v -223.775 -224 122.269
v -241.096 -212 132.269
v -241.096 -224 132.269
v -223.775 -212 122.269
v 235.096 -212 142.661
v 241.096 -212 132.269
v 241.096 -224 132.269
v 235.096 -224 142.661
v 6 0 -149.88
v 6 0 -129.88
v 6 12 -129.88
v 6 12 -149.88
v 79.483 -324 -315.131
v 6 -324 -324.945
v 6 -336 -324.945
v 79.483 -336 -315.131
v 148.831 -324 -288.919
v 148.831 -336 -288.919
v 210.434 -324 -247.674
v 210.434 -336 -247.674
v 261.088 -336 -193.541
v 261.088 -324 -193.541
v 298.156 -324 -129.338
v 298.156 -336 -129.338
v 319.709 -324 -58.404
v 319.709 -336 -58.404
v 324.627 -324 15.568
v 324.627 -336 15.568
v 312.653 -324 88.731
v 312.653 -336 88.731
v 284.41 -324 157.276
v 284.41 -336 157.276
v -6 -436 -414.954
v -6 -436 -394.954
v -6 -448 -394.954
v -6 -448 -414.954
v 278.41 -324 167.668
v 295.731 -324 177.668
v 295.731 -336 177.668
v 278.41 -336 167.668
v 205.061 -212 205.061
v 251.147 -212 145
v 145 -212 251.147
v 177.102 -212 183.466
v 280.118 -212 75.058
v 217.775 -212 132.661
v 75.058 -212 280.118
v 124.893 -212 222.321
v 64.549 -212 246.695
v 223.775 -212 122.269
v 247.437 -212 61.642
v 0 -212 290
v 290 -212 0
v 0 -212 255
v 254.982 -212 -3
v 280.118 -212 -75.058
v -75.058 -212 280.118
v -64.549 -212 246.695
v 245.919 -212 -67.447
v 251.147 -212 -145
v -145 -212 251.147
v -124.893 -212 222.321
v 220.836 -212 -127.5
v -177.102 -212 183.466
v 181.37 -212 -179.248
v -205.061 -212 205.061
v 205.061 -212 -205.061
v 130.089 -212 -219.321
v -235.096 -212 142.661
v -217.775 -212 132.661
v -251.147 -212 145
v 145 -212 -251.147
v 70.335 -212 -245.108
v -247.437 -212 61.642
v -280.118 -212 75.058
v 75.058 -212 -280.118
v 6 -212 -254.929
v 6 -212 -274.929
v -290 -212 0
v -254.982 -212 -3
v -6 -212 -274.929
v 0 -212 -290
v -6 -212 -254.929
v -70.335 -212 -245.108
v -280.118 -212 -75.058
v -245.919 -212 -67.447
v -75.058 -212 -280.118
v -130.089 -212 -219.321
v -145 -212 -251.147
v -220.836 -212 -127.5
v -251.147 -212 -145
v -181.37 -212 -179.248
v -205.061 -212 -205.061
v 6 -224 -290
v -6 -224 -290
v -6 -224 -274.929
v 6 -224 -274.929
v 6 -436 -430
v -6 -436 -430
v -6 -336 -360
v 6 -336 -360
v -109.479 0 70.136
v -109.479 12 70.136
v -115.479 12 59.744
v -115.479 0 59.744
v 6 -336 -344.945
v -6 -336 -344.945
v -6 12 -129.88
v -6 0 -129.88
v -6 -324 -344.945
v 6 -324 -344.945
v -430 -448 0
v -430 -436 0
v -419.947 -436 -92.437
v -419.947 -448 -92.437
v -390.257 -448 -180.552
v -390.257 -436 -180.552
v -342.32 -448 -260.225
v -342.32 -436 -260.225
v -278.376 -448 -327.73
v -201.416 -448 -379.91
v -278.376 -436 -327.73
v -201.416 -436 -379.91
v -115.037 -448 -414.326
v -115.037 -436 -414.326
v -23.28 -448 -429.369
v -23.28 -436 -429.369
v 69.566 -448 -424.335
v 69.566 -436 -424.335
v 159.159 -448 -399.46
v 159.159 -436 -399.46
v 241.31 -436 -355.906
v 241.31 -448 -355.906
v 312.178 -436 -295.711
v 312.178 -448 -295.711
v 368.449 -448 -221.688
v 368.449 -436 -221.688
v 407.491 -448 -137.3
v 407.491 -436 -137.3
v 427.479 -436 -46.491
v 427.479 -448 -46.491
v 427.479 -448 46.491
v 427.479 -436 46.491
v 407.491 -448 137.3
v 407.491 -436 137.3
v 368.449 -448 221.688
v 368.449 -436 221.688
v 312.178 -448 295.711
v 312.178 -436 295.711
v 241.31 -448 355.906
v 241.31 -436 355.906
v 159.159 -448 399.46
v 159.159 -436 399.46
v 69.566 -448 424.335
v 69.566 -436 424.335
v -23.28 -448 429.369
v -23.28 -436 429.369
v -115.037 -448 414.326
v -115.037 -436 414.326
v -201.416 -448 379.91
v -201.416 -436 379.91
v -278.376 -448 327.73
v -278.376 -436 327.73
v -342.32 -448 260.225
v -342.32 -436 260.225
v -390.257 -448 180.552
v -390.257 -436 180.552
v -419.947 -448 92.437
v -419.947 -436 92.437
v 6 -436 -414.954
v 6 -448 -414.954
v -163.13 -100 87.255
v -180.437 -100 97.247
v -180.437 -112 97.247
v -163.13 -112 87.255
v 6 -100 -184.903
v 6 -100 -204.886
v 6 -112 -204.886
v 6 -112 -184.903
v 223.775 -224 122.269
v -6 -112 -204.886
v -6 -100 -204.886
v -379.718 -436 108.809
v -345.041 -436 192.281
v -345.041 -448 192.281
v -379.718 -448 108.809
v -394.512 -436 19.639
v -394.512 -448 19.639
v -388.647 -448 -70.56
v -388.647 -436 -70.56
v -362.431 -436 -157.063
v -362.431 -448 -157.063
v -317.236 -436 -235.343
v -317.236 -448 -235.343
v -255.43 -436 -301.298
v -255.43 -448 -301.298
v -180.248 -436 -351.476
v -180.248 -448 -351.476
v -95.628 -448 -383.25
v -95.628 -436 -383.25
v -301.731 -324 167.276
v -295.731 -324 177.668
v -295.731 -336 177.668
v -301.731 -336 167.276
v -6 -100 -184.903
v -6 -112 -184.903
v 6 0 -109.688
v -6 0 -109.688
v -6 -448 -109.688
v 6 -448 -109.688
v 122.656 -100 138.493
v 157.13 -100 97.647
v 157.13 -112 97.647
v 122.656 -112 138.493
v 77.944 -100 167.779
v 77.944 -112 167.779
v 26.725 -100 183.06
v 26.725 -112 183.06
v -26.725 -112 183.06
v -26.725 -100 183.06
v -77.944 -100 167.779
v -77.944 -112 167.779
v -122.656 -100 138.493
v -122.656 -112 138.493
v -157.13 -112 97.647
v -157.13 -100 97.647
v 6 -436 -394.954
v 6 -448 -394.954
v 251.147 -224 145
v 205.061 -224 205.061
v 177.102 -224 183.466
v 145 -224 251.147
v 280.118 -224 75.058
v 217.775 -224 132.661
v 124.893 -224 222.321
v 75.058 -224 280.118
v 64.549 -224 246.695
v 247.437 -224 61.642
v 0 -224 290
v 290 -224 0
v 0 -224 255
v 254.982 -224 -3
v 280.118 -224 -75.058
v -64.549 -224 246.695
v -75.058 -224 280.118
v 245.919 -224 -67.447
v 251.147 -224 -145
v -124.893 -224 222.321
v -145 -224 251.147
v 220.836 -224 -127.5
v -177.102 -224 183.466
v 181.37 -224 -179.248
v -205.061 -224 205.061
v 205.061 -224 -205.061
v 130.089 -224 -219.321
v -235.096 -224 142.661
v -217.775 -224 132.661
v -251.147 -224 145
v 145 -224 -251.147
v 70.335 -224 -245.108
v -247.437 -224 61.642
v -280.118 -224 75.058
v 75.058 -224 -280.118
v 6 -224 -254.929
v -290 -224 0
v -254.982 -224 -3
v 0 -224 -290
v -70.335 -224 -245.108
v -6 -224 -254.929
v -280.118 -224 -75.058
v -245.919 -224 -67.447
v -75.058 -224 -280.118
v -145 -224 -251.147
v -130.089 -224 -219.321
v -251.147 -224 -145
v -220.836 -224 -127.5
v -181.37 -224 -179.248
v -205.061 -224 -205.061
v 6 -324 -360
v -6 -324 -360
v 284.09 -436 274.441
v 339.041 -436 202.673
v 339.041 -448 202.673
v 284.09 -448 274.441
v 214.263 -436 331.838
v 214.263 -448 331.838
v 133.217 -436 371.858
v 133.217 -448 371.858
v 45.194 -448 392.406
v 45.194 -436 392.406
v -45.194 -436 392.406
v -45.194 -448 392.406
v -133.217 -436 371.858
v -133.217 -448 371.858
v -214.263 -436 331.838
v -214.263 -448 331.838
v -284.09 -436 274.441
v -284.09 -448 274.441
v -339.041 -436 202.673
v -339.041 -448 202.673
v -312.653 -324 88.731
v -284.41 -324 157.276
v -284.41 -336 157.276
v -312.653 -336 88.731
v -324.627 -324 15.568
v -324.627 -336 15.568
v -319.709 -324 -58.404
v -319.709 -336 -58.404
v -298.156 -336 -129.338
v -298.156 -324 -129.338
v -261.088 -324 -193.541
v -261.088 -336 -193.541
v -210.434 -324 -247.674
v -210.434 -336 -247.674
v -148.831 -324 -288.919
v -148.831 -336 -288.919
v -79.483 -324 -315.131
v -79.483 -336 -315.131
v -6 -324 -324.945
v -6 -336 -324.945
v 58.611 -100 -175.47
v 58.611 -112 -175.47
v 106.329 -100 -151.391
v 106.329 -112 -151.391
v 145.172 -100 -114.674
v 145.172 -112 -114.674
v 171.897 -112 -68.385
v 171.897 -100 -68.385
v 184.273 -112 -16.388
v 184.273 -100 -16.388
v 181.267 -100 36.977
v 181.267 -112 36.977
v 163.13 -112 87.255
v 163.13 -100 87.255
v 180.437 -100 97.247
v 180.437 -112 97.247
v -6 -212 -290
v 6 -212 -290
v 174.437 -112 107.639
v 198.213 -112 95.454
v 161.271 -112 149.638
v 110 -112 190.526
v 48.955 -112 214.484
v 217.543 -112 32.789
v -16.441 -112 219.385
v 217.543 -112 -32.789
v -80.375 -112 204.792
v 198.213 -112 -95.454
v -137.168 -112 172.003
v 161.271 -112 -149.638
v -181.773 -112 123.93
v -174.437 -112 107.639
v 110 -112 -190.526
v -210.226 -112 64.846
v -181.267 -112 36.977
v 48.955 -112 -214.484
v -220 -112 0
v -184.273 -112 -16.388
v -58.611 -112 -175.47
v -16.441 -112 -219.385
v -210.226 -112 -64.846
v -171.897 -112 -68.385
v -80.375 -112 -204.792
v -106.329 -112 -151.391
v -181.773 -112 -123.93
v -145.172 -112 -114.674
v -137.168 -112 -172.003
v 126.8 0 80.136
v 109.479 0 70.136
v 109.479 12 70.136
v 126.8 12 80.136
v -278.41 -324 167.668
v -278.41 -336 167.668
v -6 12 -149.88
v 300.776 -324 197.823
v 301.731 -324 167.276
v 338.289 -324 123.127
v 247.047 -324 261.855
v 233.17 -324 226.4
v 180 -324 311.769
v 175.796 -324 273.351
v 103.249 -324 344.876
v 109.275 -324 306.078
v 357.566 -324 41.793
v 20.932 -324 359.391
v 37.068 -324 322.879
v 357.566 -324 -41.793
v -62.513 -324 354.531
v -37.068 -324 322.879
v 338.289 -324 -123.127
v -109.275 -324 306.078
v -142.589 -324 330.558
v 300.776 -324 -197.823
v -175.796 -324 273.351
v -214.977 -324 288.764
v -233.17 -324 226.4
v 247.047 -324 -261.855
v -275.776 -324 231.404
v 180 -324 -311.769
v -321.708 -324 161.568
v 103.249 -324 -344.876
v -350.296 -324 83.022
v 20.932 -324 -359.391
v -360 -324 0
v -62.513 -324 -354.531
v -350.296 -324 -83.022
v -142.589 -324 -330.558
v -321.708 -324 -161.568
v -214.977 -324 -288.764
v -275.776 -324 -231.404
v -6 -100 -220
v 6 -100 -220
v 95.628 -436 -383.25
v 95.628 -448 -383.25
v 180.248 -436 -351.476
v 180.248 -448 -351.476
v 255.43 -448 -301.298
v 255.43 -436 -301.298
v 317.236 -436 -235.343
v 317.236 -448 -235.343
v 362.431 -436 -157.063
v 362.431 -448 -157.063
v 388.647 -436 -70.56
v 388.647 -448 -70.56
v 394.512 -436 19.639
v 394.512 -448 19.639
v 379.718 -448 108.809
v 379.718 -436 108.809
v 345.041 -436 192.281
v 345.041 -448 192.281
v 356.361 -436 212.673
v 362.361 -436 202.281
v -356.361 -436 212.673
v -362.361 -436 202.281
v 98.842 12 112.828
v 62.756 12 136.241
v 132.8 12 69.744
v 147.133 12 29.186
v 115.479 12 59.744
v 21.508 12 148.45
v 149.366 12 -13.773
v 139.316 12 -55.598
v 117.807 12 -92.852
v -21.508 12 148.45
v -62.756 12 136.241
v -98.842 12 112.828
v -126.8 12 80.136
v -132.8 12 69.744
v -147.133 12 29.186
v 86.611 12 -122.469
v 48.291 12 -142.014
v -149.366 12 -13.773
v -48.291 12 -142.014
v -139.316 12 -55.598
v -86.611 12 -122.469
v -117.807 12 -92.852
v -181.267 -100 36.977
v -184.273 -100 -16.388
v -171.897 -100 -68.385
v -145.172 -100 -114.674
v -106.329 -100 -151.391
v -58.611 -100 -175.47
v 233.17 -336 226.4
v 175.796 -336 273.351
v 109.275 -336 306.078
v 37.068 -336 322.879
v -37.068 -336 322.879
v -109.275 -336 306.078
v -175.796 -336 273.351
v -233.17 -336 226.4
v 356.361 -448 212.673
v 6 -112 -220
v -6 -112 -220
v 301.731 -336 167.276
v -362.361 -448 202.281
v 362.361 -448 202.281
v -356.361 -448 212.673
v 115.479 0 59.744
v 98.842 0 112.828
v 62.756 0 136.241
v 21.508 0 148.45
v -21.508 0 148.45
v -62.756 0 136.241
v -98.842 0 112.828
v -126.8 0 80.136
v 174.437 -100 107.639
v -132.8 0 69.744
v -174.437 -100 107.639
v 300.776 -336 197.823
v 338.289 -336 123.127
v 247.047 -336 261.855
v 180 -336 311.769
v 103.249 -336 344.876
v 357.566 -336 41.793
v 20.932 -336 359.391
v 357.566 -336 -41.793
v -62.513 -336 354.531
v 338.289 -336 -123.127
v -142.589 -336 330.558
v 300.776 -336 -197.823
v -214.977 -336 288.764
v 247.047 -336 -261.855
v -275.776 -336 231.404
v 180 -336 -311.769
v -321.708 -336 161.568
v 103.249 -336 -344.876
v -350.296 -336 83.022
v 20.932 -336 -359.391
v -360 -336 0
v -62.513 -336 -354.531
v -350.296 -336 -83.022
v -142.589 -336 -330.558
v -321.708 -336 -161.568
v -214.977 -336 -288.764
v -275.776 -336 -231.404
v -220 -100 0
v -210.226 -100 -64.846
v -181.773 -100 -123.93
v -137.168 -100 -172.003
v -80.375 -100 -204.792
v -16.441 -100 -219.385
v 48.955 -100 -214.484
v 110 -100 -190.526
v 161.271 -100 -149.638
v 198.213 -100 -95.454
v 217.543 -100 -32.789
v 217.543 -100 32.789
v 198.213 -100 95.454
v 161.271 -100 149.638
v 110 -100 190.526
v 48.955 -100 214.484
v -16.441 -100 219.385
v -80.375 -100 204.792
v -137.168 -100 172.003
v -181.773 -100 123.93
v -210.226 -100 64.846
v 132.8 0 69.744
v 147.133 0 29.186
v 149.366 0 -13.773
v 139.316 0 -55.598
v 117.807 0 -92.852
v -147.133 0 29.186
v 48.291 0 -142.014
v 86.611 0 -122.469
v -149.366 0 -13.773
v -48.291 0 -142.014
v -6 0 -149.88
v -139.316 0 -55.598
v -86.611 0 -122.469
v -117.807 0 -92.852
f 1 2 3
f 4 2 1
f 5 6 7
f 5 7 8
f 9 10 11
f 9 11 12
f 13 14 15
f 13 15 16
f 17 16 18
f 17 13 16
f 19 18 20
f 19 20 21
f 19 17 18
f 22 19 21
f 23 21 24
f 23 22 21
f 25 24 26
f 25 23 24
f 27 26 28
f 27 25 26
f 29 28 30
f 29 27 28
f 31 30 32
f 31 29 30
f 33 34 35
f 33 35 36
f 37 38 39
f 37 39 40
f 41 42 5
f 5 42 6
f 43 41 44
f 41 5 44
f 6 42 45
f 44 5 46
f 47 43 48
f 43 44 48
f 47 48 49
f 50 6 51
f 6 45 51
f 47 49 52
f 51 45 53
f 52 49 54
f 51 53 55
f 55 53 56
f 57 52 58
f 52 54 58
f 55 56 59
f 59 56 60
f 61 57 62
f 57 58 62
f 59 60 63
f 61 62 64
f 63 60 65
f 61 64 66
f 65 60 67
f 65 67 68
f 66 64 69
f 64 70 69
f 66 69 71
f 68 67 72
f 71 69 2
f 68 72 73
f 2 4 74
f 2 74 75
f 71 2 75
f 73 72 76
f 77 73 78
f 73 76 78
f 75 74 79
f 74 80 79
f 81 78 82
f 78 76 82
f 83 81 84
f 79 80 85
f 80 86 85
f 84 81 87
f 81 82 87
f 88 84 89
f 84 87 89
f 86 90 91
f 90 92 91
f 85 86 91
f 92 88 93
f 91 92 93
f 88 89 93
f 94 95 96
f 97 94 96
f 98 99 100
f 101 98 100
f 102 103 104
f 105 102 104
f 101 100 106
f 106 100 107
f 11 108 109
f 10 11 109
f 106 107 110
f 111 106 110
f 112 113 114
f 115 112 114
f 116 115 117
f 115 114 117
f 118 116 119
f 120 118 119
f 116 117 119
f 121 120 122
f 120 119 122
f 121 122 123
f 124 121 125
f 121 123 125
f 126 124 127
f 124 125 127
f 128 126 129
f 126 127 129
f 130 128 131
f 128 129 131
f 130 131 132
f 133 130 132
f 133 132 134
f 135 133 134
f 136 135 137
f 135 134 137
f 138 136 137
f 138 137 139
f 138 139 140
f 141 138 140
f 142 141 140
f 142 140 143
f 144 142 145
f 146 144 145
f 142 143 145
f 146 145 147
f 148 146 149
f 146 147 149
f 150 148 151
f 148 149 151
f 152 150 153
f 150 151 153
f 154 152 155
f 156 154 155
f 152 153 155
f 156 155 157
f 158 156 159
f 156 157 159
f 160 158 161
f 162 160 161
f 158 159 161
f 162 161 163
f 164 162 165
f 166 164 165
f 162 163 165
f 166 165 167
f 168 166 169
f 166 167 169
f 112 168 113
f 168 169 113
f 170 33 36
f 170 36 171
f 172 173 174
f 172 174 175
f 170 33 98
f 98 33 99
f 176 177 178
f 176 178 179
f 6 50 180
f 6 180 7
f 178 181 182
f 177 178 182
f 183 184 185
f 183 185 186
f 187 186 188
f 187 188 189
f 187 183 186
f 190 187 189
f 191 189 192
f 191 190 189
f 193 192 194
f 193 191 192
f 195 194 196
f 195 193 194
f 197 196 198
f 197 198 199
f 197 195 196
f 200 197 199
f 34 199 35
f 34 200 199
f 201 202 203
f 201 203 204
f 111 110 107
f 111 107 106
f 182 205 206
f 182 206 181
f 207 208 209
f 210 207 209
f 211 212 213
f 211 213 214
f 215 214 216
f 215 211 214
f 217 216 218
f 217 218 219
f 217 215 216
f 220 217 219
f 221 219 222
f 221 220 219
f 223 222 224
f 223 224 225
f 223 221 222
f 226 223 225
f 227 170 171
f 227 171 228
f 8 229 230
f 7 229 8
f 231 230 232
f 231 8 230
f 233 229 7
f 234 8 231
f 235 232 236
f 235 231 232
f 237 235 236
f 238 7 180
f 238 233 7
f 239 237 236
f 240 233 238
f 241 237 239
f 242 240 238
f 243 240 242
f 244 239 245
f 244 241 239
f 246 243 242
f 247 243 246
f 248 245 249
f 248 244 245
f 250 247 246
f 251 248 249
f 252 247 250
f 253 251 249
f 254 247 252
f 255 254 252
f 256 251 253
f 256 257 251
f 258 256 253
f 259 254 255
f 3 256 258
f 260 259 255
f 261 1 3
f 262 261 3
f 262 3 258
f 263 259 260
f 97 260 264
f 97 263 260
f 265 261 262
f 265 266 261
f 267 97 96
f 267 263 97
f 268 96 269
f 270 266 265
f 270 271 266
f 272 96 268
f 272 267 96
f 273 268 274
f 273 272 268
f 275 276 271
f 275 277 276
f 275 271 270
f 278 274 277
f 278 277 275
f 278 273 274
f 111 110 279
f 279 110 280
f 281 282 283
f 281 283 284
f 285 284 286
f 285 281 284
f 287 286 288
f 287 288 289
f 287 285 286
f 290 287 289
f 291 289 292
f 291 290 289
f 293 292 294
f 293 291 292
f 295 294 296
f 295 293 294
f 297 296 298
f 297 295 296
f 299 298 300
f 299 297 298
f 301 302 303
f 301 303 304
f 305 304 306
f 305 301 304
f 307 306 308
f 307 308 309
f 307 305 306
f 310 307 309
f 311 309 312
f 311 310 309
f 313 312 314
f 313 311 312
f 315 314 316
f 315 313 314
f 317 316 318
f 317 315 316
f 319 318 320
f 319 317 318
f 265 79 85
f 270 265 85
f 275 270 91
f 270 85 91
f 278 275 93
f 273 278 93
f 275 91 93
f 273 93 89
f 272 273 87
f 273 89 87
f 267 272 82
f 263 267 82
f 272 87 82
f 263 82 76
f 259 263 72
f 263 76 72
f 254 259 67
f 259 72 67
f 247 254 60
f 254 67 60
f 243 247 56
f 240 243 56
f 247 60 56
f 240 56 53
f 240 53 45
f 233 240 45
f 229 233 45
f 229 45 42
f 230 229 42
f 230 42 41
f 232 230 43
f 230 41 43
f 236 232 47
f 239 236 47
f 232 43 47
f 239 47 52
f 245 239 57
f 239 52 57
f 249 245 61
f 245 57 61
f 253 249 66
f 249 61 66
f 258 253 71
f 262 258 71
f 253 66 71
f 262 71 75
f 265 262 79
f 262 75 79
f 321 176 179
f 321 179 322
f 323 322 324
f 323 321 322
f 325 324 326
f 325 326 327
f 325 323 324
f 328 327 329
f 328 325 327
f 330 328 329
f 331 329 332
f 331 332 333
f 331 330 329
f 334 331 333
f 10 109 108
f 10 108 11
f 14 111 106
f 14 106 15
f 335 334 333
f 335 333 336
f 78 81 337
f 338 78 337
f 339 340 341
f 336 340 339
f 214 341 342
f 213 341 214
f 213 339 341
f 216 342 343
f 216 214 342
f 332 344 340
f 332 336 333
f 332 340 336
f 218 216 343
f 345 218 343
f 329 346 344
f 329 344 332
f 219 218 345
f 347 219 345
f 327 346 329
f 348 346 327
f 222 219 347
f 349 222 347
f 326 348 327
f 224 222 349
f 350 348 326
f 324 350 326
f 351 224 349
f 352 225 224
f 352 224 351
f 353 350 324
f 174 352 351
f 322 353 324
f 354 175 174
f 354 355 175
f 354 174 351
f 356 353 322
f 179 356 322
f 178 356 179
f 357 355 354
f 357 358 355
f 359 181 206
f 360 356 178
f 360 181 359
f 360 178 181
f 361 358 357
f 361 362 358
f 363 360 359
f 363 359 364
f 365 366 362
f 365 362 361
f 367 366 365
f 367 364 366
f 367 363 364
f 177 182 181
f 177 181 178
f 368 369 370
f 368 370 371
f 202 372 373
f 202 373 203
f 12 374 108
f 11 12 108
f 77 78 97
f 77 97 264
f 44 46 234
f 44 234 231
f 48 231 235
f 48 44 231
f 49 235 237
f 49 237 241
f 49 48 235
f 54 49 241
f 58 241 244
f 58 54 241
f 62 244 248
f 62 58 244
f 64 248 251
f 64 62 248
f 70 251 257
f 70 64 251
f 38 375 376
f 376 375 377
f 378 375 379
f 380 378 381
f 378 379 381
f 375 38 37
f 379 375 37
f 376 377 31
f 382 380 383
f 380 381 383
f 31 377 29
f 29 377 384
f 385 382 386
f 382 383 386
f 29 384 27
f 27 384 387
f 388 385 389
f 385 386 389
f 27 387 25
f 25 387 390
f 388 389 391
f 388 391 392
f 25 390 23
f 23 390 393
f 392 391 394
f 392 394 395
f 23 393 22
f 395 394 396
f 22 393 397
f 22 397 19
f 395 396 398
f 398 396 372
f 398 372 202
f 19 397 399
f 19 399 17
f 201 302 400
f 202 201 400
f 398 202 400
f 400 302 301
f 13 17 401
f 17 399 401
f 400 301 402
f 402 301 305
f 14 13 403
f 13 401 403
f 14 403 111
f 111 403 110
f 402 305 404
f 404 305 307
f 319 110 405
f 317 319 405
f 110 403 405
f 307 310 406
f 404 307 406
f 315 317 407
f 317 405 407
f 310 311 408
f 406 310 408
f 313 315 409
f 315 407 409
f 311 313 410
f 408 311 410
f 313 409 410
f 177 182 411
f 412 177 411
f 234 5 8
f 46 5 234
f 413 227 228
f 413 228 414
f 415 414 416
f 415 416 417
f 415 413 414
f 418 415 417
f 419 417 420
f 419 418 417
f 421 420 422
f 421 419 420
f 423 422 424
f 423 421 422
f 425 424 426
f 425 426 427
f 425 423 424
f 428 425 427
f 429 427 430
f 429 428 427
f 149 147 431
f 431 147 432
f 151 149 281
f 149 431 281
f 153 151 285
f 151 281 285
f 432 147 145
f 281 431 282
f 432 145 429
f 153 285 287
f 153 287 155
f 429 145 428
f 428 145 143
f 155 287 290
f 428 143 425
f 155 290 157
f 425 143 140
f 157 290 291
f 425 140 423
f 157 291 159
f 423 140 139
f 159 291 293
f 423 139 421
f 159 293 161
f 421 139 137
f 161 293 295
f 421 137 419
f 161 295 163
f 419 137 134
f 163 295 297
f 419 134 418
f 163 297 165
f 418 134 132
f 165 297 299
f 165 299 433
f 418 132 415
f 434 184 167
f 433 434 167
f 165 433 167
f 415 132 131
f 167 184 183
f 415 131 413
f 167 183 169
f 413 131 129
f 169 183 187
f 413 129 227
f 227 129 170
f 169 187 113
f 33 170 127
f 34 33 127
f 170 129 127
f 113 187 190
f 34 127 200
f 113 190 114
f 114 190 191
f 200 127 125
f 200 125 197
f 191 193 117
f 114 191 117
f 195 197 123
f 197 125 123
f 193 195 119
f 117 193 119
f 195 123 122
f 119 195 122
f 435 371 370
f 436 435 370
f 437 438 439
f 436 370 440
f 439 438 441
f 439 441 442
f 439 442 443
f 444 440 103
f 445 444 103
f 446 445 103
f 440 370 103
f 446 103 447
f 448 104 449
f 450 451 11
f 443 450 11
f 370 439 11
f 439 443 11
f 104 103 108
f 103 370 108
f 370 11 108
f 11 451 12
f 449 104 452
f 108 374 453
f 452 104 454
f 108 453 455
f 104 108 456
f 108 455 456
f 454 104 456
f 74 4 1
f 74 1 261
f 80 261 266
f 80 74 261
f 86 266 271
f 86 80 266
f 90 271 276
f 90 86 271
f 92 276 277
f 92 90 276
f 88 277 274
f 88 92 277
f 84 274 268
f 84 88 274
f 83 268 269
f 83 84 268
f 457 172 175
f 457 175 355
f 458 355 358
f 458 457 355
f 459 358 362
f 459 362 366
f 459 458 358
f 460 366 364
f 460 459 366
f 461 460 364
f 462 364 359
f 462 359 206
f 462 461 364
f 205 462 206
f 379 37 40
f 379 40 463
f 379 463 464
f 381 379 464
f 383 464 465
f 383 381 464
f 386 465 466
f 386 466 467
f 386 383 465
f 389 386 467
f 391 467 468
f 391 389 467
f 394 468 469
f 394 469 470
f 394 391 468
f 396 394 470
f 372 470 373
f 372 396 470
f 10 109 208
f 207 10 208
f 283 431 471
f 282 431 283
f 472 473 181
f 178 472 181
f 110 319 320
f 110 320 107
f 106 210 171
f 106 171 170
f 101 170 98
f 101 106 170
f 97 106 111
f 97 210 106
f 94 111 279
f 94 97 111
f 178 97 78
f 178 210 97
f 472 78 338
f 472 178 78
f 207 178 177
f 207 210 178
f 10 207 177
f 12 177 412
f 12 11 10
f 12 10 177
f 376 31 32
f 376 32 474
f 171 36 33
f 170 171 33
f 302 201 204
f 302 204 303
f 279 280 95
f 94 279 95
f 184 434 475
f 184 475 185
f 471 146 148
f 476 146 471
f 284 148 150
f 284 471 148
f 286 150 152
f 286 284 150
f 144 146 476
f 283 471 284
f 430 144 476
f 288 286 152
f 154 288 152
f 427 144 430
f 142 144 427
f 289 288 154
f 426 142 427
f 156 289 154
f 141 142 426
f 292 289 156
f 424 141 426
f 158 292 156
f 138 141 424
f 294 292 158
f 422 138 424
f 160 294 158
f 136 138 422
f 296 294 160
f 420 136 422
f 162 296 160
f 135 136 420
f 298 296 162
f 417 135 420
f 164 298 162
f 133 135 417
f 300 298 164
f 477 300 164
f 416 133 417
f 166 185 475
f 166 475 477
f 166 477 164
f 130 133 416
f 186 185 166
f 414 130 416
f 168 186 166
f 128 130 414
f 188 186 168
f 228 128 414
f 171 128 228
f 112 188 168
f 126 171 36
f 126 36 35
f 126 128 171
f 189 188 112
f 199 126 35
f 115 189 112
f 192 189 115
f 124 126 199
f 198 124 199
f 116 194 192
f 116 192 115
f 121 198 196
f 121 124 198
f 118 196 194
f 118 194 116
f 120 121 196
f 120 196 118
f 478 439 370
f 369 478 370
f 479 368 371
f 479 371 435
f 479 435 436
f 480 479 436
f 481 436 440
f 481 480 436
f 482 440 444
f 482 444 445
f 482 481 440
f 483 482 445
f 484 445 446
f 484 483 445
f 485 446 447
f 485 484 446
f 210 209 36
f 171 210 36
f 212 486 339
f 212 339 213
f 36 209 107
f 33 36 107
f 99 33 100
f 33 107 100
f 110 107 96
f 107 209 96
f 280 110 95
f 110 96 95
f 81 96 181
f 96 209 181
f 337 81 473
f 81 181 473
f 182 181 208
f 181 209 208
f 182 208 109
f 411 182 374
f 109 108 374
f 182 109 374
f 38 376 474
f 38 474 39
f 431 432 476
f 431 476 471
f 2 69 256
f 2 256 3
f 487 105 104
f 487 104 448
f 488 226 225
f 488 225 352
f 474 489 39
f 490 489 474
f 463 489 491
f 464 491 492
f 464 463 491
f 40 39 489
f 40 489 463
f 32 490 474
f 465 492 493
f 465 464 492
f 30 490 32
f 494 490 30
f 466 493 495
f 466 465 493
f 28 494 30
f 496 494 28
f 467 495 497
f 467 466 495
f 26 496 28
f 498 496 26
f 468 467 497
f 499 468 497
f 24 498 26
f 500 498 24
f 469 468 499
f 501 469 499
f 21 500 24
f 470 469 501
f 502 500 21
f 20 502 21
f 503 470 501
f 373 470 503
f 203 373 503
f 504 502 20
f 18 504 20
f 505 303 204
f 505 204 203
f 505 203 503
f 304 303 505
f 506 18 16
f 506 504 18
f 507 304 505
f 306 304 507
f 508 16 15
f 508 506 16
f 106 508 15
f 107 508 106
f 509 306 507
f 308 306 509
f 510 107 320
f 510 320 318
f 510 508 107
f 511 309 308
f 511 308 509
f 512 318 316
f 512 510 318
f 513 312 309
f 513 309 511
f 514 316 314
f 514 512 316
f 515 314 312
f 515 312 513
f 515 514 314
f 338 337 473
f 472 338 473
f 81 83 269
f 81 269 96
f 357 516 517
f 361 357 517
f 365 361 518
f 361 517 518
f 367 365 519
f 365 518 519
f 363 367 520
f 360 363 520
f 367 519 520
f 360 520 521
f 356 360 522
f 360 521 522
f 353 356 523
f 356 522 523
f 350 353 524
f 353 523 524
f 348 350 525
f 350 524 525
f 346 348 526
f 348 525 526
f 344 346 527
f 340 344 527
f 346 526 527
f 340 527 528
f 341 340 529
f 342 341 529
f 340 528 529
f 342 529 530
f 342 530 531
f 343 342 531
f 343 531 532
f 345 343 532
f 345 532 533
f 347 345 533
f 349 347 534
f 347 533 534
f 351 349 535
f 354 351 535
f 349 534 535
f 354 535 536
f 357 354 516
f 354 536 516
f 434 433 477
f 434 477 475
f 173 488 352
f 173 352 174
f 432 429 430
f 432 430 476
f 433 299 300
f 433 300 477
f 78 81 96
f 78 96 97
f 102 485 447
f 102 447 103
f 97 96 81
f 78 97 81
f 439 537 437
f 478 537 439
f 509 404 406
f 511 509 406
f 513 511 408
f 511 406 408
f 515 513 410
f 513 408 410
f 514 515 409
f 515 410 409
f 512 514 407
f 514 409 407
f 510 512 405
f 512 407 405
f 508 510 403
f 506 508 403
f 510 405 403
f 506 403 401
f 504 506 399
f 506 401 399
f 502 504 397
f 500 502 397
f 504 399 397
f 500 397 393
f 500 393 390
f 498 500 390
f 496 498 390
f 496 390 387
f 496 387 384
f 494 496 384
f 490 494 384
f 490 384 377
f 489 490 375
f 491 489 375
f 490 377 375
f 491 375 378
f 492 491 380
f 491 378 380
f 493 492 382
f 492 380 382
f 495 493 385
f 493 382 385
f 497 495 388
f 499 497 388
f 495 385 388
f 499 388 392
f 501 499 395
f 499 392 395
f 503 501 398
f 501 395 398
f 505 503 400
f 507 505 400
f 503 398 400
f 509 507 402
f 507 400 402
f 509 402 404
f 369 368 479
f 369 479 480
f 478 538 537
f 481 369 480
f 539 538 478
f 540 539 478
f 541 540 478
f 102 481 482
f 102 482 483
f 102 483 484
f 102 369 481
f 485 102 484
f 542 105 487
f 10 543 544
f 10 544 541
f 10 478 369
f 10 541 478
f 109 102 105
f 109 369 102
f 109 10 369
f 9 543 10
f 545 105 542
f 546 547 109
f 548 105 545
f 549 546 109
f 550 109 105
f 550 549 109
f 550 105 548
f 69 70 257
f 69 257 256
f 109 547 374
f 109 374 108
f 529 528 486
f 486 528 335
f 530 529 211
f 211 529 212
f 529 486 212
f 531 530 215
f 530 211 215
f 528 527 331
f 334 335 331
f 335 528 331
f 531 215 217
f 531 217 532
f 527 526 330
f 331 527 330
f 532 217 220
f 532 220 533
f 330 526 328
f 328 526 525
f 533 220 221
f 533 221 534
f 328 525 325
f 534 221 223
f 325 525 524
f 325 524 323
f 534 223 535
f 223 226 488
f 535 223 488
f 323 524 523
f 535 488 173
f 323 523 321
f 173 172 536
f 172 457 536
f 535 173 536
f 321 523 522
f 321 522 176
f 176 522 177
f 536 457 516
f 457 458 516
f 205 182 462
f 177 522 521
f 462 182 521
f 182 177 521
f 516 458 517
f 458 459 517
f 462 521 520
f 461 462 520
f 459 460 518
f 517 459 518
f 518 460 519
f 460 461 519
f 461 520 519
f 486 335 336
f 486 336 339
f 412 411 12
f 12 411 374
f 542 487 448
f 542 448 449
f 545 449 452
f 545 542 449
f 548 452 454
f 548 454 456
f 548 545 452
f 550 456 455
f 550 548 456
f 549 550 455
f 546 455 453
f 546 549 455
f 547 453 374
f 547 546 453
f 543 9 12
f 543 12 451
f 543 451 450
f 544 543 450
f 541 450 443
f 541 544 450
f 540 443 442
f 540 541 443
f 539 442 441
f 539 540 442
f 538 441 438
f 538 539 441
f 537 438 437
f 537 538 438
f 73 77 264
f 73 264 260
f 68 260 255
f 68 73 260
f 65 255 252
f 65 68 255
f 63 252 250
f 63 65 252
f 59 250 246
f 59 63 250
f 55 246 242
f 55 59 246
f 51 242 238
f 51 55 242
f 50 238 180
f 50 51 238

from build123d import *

# Parameters (mm, degrees)
BOSS_EXTRUDE1_DEPTH = 12
SKETCH2_R           = 220
BOSS_EXTRUDE2_DEPTH = 12
SKETCH3_R           = 290
BOSS_EXTRUDE3_DEPTH = 12
SKETCH4_R           = 360
BOSS_EXTRUDE4_DEPTH = 12
SKETCH5_R           = 430
BOSS_EXTRUDE5_DEPTH = 12
BOSS_EXTRUDE6_DEPTH = 12


with BuildPart() as part:
    # Sketch1 → Boss-Extrude1 (new body)
    with BuildSketch(Plane(origin=(0, 0, 0), x_dir=(1, 0, 0), z_dir=(0, 1, 0))):
        with BuildLine():
            Line((109.479337841, -70.136128403), (126.799845917, -80.136128403))
            ThreePointArc((126.799845917, -80.136128403), (0, -150), (-126.799845917, -80.136128403))
            Line((-126.799845917, -80.136128403), (-109.479337841, -70.136128403))
            Line((-109.479337841, -70.136128403), (-115.479337841, -59.743823558))
            Line((-115.479337841, -59.743823558), (-132.799845917, -69.743823558))
            ThreePointArc((-132.799845917, -69.743823558), (-129.903810568, 75), (-6, 149.879951962))
            Line((-6, 149.879951962), (-6, 129.879951962))
            Line((-6, 129.879951962), (6, 129.879951962))
            Line((6, 129.879951962), (6, 149.879951962))
            ThreePointArc((6, 149.879951962), (129.903810568, 75), (132.799845917, -69.743823558))
            Line((132.799845917, -69.743823558), (115.479337841, -59.743823558))
            Line((115.479337841, -59.743823558), (109.479337841, -70.136128403))
        make_face()
    extrude(amount=BOSS_EXTRUDE1_DEPTH)


with BuildPart() as body_2:
    # Sketch2 → Boss-Extrude2 (new body)
    with BuildSketch(Plane(origin=(0, -100, 0), x_dir=(-1, 0, 0), z_dir=(0, -1, 0))):
        Circle(SKETCH2_R)
        with BuildLine():
            Line((180.436842735, -97.247056494), (163.130415599, -87.255186129))
            ThreePointArc((163.130415599, -87.255186129), (160.2146997, 92.5), (6, 184.902677103))
            Line((6, 184.902677103), (6, 204.886417834))
            Line((6, 204.886417834), (-6, 204.886417834))
            Line((-6, 204.886417834), (-6, 184.902677103))
            ThreePointArc((-6, 184.902677103), (-160.2146997, 92.5), (-163.130415599, -87.255186129))
            Line((-163.130415599, -87.255186129), (-180.436842735, -97.247056494))
            Line((-180.436842735, -97.247056494), (-174.436842735, -107.63936134))
            Line((-174.436842735, -107.63936134), (-157.130415599, -97.647490974))
            ThreePointArc((-157.130415599, -97.647490974), (0, -185), (157.130415599, -97.647490974))
            Line((157.130415599, -97.647490974), (174.436842735, -107.63936134))
            Line((174.436842735, -107.63936134), (180.436842735, -97.247056494))
        make_face(mode=Mode.SUBTRACT)
    extrude(amount=BOSS_EXTRUDE2_DEPTH)


with BuildPart() as body_3:
    # Sketch3 → Boss-Extrude3 (new body)
    with BuildSketch(Plane(origin=(0, -212, 0), x_dir=(-1, 0, 0), z_dir=(0, -1, 0))):
        Circle(SKETCH3_R)
        with BuildLine():
            Line((241.095846372, -132.268548573), (223.775338297, -122.268548573))
            ThreePointArc((223.775338297, -122.268548573), (220.836477965, 127.5), (6, 254.929401992))
            Line((6, 254.929401992), (6, 274.929401992))
            Line((6, 274.929401992), (-6, 274.929401992))
            Line((-6, 274.929401992), (-6, 254.929401992))
            ThreePointArc((-6, 254.929401992), (-220.836477965, 127.5), (-223.775338297, -122.268548573))
            Line((-223.775338297, -122.268548573), (-241.095846372, -132.268548573))
            Line((-241.095846372, -132.268548573), (-235.095846372, -142.660853419))
            Line((-235.095846372, -142.660853419), (-217.775338297, -132.660853419))
            ThreePointArc((-217.775338297, -132.660853419), (0, -255), (217.775338297, -132.660853419))
            Line((217.775338297, -132.660853419), (235.095846372, -142.660853419))
            Line((235.095846372, -142.660853419), (241.095846372, -132.268548573))
        make_face(mode=Mode.SUBTRACT)
    extrude(amount=BOSS_EXTRUDE3_DEPTH)


with BuildPart() as body_4:
    # Sketch4 → Boss-Extrude4 (new body)
    with BuildSketch(Plane(origin=(0, -324, 0), x_dir=(-1, 0, 0), z_dir=(0, -1, 0))):
        Circle(SKETCH4_R)
        with BuildLine():
            Line((301.730795734, -167.27615291), (284.410287658, -157.27615291))
            ThreePointArc((284.410287658, -157.27615291), (281.45825623, 162.5), (6, 324.944610665))
            Line((6, 324.944610665), (6, 344.944610665))
            Line((6, 344.944610665), (-6, 344.944610665))
            Line((-6, 344.944610665), (-6, 324.944610665))
            ThreePointArc((-6, 324.944610665), (-281.45825623, 162.5), (-284.410287658, -157.27615291))
            Line((-284.410287658, -157.27615291), (-301.730795734, -167.27615291))
            Line((-301.730795734, -167.27615291), (-295.730795734, -177.668457755))
            Line((-295.730795734, -177.668457755), (-278.410287658, -167.668457755))
            ThreePointArc((-278.410287658, -167.668457755), (0, -325), (278.410287658, -167.668457755))
            Line((278.410287658, -167.668457755), (295.730795734, -177.668457755))
            Line((295.730795734, -177.668457755), (301.730795734, -167.27615291))
        make_face(mode=Mode.SUBTRACT)
    extrude(amount=BOSS_EXTRUDE4_DEPTH)


with BuildPart() as body_5:
    # Sketch5 → Boss-Extrude5 (new body)
    with BuildSketch(Plane(origin=(0, -436, 0), x_dir=(-1, 0, 0), z_dir=(0, -1, 0))):
        Circle(SKETCH5_R)
        with BuildLine():
            Line((362.361075845, -202.281061453), (345.040567769, -192.281061453))
            ThreePointArc((345.040567769, -192.281061453), (342.080034495, 197.5), (6, 394.954427751))
            Line((6, 394.954427751), (6, 414.954427751))
            Line((6, 414.954427751), (-6, 414.954427751))
            Line((-6, 414.954427751), (-6, 394.954427751))
            ThreePointArc((-6, 394.954427751), (-342.080034495, 197.5), (-345.040567769, -192.281061453))
            Line((-345.040567769, -192.281061453), (-362.361075845, -202.281061453))
            Line((-362.361075845, -202.281061453), (-356.361075845, -212.673366298))
            Line((-356.361075845, -212.673366298), (-339.040567769, -202.673366298))
            ThreePointArc((-339.040567769, -202.673366298), (0, -395), (339.040567769, -202.673366298))
            Line((339.040567769, -202.673366298), (356.361075845, -212.673366298))
            Line((356.361075845, -212.673366298), (362.361075845, -202.281061453))
        make_face(mode=Mode.SUBTRACT)
    extrude(amount=BOSS_EXTRUDE5_DEPTH)


with BuildPart() as body_6:
    # Sketch7 → Boss-Extrude6 (new body)
    with BuildSketch(Plane(origin=(-6, 0, 0), x_dir=(0, 0, -1), z_dir=(1, 0, 0))):
        Polygon((109.688052229, -448), (414.954427751, -448), (414.954427751, -436), (430, -436), (360, -336), (344.944610665, -336), (344.944610665, -324), (360, -324), (290, -224), (274.929401992, -224), (274.929401992, -212), (290, -212), (220, -112), (204.886417834, -112), (204.886417834, -100), (220, -100), (149.879951962, 12), (129.879951962, 12), (129.879951962, 0), (109.688052229, 0), align=None)
    extrude(amount=BOSS_EXTRUDE6_DEPTH)


solid = Compound([part.part, body_2.part, body_3.part, body_4.part, body_5.part, body_6.part])
